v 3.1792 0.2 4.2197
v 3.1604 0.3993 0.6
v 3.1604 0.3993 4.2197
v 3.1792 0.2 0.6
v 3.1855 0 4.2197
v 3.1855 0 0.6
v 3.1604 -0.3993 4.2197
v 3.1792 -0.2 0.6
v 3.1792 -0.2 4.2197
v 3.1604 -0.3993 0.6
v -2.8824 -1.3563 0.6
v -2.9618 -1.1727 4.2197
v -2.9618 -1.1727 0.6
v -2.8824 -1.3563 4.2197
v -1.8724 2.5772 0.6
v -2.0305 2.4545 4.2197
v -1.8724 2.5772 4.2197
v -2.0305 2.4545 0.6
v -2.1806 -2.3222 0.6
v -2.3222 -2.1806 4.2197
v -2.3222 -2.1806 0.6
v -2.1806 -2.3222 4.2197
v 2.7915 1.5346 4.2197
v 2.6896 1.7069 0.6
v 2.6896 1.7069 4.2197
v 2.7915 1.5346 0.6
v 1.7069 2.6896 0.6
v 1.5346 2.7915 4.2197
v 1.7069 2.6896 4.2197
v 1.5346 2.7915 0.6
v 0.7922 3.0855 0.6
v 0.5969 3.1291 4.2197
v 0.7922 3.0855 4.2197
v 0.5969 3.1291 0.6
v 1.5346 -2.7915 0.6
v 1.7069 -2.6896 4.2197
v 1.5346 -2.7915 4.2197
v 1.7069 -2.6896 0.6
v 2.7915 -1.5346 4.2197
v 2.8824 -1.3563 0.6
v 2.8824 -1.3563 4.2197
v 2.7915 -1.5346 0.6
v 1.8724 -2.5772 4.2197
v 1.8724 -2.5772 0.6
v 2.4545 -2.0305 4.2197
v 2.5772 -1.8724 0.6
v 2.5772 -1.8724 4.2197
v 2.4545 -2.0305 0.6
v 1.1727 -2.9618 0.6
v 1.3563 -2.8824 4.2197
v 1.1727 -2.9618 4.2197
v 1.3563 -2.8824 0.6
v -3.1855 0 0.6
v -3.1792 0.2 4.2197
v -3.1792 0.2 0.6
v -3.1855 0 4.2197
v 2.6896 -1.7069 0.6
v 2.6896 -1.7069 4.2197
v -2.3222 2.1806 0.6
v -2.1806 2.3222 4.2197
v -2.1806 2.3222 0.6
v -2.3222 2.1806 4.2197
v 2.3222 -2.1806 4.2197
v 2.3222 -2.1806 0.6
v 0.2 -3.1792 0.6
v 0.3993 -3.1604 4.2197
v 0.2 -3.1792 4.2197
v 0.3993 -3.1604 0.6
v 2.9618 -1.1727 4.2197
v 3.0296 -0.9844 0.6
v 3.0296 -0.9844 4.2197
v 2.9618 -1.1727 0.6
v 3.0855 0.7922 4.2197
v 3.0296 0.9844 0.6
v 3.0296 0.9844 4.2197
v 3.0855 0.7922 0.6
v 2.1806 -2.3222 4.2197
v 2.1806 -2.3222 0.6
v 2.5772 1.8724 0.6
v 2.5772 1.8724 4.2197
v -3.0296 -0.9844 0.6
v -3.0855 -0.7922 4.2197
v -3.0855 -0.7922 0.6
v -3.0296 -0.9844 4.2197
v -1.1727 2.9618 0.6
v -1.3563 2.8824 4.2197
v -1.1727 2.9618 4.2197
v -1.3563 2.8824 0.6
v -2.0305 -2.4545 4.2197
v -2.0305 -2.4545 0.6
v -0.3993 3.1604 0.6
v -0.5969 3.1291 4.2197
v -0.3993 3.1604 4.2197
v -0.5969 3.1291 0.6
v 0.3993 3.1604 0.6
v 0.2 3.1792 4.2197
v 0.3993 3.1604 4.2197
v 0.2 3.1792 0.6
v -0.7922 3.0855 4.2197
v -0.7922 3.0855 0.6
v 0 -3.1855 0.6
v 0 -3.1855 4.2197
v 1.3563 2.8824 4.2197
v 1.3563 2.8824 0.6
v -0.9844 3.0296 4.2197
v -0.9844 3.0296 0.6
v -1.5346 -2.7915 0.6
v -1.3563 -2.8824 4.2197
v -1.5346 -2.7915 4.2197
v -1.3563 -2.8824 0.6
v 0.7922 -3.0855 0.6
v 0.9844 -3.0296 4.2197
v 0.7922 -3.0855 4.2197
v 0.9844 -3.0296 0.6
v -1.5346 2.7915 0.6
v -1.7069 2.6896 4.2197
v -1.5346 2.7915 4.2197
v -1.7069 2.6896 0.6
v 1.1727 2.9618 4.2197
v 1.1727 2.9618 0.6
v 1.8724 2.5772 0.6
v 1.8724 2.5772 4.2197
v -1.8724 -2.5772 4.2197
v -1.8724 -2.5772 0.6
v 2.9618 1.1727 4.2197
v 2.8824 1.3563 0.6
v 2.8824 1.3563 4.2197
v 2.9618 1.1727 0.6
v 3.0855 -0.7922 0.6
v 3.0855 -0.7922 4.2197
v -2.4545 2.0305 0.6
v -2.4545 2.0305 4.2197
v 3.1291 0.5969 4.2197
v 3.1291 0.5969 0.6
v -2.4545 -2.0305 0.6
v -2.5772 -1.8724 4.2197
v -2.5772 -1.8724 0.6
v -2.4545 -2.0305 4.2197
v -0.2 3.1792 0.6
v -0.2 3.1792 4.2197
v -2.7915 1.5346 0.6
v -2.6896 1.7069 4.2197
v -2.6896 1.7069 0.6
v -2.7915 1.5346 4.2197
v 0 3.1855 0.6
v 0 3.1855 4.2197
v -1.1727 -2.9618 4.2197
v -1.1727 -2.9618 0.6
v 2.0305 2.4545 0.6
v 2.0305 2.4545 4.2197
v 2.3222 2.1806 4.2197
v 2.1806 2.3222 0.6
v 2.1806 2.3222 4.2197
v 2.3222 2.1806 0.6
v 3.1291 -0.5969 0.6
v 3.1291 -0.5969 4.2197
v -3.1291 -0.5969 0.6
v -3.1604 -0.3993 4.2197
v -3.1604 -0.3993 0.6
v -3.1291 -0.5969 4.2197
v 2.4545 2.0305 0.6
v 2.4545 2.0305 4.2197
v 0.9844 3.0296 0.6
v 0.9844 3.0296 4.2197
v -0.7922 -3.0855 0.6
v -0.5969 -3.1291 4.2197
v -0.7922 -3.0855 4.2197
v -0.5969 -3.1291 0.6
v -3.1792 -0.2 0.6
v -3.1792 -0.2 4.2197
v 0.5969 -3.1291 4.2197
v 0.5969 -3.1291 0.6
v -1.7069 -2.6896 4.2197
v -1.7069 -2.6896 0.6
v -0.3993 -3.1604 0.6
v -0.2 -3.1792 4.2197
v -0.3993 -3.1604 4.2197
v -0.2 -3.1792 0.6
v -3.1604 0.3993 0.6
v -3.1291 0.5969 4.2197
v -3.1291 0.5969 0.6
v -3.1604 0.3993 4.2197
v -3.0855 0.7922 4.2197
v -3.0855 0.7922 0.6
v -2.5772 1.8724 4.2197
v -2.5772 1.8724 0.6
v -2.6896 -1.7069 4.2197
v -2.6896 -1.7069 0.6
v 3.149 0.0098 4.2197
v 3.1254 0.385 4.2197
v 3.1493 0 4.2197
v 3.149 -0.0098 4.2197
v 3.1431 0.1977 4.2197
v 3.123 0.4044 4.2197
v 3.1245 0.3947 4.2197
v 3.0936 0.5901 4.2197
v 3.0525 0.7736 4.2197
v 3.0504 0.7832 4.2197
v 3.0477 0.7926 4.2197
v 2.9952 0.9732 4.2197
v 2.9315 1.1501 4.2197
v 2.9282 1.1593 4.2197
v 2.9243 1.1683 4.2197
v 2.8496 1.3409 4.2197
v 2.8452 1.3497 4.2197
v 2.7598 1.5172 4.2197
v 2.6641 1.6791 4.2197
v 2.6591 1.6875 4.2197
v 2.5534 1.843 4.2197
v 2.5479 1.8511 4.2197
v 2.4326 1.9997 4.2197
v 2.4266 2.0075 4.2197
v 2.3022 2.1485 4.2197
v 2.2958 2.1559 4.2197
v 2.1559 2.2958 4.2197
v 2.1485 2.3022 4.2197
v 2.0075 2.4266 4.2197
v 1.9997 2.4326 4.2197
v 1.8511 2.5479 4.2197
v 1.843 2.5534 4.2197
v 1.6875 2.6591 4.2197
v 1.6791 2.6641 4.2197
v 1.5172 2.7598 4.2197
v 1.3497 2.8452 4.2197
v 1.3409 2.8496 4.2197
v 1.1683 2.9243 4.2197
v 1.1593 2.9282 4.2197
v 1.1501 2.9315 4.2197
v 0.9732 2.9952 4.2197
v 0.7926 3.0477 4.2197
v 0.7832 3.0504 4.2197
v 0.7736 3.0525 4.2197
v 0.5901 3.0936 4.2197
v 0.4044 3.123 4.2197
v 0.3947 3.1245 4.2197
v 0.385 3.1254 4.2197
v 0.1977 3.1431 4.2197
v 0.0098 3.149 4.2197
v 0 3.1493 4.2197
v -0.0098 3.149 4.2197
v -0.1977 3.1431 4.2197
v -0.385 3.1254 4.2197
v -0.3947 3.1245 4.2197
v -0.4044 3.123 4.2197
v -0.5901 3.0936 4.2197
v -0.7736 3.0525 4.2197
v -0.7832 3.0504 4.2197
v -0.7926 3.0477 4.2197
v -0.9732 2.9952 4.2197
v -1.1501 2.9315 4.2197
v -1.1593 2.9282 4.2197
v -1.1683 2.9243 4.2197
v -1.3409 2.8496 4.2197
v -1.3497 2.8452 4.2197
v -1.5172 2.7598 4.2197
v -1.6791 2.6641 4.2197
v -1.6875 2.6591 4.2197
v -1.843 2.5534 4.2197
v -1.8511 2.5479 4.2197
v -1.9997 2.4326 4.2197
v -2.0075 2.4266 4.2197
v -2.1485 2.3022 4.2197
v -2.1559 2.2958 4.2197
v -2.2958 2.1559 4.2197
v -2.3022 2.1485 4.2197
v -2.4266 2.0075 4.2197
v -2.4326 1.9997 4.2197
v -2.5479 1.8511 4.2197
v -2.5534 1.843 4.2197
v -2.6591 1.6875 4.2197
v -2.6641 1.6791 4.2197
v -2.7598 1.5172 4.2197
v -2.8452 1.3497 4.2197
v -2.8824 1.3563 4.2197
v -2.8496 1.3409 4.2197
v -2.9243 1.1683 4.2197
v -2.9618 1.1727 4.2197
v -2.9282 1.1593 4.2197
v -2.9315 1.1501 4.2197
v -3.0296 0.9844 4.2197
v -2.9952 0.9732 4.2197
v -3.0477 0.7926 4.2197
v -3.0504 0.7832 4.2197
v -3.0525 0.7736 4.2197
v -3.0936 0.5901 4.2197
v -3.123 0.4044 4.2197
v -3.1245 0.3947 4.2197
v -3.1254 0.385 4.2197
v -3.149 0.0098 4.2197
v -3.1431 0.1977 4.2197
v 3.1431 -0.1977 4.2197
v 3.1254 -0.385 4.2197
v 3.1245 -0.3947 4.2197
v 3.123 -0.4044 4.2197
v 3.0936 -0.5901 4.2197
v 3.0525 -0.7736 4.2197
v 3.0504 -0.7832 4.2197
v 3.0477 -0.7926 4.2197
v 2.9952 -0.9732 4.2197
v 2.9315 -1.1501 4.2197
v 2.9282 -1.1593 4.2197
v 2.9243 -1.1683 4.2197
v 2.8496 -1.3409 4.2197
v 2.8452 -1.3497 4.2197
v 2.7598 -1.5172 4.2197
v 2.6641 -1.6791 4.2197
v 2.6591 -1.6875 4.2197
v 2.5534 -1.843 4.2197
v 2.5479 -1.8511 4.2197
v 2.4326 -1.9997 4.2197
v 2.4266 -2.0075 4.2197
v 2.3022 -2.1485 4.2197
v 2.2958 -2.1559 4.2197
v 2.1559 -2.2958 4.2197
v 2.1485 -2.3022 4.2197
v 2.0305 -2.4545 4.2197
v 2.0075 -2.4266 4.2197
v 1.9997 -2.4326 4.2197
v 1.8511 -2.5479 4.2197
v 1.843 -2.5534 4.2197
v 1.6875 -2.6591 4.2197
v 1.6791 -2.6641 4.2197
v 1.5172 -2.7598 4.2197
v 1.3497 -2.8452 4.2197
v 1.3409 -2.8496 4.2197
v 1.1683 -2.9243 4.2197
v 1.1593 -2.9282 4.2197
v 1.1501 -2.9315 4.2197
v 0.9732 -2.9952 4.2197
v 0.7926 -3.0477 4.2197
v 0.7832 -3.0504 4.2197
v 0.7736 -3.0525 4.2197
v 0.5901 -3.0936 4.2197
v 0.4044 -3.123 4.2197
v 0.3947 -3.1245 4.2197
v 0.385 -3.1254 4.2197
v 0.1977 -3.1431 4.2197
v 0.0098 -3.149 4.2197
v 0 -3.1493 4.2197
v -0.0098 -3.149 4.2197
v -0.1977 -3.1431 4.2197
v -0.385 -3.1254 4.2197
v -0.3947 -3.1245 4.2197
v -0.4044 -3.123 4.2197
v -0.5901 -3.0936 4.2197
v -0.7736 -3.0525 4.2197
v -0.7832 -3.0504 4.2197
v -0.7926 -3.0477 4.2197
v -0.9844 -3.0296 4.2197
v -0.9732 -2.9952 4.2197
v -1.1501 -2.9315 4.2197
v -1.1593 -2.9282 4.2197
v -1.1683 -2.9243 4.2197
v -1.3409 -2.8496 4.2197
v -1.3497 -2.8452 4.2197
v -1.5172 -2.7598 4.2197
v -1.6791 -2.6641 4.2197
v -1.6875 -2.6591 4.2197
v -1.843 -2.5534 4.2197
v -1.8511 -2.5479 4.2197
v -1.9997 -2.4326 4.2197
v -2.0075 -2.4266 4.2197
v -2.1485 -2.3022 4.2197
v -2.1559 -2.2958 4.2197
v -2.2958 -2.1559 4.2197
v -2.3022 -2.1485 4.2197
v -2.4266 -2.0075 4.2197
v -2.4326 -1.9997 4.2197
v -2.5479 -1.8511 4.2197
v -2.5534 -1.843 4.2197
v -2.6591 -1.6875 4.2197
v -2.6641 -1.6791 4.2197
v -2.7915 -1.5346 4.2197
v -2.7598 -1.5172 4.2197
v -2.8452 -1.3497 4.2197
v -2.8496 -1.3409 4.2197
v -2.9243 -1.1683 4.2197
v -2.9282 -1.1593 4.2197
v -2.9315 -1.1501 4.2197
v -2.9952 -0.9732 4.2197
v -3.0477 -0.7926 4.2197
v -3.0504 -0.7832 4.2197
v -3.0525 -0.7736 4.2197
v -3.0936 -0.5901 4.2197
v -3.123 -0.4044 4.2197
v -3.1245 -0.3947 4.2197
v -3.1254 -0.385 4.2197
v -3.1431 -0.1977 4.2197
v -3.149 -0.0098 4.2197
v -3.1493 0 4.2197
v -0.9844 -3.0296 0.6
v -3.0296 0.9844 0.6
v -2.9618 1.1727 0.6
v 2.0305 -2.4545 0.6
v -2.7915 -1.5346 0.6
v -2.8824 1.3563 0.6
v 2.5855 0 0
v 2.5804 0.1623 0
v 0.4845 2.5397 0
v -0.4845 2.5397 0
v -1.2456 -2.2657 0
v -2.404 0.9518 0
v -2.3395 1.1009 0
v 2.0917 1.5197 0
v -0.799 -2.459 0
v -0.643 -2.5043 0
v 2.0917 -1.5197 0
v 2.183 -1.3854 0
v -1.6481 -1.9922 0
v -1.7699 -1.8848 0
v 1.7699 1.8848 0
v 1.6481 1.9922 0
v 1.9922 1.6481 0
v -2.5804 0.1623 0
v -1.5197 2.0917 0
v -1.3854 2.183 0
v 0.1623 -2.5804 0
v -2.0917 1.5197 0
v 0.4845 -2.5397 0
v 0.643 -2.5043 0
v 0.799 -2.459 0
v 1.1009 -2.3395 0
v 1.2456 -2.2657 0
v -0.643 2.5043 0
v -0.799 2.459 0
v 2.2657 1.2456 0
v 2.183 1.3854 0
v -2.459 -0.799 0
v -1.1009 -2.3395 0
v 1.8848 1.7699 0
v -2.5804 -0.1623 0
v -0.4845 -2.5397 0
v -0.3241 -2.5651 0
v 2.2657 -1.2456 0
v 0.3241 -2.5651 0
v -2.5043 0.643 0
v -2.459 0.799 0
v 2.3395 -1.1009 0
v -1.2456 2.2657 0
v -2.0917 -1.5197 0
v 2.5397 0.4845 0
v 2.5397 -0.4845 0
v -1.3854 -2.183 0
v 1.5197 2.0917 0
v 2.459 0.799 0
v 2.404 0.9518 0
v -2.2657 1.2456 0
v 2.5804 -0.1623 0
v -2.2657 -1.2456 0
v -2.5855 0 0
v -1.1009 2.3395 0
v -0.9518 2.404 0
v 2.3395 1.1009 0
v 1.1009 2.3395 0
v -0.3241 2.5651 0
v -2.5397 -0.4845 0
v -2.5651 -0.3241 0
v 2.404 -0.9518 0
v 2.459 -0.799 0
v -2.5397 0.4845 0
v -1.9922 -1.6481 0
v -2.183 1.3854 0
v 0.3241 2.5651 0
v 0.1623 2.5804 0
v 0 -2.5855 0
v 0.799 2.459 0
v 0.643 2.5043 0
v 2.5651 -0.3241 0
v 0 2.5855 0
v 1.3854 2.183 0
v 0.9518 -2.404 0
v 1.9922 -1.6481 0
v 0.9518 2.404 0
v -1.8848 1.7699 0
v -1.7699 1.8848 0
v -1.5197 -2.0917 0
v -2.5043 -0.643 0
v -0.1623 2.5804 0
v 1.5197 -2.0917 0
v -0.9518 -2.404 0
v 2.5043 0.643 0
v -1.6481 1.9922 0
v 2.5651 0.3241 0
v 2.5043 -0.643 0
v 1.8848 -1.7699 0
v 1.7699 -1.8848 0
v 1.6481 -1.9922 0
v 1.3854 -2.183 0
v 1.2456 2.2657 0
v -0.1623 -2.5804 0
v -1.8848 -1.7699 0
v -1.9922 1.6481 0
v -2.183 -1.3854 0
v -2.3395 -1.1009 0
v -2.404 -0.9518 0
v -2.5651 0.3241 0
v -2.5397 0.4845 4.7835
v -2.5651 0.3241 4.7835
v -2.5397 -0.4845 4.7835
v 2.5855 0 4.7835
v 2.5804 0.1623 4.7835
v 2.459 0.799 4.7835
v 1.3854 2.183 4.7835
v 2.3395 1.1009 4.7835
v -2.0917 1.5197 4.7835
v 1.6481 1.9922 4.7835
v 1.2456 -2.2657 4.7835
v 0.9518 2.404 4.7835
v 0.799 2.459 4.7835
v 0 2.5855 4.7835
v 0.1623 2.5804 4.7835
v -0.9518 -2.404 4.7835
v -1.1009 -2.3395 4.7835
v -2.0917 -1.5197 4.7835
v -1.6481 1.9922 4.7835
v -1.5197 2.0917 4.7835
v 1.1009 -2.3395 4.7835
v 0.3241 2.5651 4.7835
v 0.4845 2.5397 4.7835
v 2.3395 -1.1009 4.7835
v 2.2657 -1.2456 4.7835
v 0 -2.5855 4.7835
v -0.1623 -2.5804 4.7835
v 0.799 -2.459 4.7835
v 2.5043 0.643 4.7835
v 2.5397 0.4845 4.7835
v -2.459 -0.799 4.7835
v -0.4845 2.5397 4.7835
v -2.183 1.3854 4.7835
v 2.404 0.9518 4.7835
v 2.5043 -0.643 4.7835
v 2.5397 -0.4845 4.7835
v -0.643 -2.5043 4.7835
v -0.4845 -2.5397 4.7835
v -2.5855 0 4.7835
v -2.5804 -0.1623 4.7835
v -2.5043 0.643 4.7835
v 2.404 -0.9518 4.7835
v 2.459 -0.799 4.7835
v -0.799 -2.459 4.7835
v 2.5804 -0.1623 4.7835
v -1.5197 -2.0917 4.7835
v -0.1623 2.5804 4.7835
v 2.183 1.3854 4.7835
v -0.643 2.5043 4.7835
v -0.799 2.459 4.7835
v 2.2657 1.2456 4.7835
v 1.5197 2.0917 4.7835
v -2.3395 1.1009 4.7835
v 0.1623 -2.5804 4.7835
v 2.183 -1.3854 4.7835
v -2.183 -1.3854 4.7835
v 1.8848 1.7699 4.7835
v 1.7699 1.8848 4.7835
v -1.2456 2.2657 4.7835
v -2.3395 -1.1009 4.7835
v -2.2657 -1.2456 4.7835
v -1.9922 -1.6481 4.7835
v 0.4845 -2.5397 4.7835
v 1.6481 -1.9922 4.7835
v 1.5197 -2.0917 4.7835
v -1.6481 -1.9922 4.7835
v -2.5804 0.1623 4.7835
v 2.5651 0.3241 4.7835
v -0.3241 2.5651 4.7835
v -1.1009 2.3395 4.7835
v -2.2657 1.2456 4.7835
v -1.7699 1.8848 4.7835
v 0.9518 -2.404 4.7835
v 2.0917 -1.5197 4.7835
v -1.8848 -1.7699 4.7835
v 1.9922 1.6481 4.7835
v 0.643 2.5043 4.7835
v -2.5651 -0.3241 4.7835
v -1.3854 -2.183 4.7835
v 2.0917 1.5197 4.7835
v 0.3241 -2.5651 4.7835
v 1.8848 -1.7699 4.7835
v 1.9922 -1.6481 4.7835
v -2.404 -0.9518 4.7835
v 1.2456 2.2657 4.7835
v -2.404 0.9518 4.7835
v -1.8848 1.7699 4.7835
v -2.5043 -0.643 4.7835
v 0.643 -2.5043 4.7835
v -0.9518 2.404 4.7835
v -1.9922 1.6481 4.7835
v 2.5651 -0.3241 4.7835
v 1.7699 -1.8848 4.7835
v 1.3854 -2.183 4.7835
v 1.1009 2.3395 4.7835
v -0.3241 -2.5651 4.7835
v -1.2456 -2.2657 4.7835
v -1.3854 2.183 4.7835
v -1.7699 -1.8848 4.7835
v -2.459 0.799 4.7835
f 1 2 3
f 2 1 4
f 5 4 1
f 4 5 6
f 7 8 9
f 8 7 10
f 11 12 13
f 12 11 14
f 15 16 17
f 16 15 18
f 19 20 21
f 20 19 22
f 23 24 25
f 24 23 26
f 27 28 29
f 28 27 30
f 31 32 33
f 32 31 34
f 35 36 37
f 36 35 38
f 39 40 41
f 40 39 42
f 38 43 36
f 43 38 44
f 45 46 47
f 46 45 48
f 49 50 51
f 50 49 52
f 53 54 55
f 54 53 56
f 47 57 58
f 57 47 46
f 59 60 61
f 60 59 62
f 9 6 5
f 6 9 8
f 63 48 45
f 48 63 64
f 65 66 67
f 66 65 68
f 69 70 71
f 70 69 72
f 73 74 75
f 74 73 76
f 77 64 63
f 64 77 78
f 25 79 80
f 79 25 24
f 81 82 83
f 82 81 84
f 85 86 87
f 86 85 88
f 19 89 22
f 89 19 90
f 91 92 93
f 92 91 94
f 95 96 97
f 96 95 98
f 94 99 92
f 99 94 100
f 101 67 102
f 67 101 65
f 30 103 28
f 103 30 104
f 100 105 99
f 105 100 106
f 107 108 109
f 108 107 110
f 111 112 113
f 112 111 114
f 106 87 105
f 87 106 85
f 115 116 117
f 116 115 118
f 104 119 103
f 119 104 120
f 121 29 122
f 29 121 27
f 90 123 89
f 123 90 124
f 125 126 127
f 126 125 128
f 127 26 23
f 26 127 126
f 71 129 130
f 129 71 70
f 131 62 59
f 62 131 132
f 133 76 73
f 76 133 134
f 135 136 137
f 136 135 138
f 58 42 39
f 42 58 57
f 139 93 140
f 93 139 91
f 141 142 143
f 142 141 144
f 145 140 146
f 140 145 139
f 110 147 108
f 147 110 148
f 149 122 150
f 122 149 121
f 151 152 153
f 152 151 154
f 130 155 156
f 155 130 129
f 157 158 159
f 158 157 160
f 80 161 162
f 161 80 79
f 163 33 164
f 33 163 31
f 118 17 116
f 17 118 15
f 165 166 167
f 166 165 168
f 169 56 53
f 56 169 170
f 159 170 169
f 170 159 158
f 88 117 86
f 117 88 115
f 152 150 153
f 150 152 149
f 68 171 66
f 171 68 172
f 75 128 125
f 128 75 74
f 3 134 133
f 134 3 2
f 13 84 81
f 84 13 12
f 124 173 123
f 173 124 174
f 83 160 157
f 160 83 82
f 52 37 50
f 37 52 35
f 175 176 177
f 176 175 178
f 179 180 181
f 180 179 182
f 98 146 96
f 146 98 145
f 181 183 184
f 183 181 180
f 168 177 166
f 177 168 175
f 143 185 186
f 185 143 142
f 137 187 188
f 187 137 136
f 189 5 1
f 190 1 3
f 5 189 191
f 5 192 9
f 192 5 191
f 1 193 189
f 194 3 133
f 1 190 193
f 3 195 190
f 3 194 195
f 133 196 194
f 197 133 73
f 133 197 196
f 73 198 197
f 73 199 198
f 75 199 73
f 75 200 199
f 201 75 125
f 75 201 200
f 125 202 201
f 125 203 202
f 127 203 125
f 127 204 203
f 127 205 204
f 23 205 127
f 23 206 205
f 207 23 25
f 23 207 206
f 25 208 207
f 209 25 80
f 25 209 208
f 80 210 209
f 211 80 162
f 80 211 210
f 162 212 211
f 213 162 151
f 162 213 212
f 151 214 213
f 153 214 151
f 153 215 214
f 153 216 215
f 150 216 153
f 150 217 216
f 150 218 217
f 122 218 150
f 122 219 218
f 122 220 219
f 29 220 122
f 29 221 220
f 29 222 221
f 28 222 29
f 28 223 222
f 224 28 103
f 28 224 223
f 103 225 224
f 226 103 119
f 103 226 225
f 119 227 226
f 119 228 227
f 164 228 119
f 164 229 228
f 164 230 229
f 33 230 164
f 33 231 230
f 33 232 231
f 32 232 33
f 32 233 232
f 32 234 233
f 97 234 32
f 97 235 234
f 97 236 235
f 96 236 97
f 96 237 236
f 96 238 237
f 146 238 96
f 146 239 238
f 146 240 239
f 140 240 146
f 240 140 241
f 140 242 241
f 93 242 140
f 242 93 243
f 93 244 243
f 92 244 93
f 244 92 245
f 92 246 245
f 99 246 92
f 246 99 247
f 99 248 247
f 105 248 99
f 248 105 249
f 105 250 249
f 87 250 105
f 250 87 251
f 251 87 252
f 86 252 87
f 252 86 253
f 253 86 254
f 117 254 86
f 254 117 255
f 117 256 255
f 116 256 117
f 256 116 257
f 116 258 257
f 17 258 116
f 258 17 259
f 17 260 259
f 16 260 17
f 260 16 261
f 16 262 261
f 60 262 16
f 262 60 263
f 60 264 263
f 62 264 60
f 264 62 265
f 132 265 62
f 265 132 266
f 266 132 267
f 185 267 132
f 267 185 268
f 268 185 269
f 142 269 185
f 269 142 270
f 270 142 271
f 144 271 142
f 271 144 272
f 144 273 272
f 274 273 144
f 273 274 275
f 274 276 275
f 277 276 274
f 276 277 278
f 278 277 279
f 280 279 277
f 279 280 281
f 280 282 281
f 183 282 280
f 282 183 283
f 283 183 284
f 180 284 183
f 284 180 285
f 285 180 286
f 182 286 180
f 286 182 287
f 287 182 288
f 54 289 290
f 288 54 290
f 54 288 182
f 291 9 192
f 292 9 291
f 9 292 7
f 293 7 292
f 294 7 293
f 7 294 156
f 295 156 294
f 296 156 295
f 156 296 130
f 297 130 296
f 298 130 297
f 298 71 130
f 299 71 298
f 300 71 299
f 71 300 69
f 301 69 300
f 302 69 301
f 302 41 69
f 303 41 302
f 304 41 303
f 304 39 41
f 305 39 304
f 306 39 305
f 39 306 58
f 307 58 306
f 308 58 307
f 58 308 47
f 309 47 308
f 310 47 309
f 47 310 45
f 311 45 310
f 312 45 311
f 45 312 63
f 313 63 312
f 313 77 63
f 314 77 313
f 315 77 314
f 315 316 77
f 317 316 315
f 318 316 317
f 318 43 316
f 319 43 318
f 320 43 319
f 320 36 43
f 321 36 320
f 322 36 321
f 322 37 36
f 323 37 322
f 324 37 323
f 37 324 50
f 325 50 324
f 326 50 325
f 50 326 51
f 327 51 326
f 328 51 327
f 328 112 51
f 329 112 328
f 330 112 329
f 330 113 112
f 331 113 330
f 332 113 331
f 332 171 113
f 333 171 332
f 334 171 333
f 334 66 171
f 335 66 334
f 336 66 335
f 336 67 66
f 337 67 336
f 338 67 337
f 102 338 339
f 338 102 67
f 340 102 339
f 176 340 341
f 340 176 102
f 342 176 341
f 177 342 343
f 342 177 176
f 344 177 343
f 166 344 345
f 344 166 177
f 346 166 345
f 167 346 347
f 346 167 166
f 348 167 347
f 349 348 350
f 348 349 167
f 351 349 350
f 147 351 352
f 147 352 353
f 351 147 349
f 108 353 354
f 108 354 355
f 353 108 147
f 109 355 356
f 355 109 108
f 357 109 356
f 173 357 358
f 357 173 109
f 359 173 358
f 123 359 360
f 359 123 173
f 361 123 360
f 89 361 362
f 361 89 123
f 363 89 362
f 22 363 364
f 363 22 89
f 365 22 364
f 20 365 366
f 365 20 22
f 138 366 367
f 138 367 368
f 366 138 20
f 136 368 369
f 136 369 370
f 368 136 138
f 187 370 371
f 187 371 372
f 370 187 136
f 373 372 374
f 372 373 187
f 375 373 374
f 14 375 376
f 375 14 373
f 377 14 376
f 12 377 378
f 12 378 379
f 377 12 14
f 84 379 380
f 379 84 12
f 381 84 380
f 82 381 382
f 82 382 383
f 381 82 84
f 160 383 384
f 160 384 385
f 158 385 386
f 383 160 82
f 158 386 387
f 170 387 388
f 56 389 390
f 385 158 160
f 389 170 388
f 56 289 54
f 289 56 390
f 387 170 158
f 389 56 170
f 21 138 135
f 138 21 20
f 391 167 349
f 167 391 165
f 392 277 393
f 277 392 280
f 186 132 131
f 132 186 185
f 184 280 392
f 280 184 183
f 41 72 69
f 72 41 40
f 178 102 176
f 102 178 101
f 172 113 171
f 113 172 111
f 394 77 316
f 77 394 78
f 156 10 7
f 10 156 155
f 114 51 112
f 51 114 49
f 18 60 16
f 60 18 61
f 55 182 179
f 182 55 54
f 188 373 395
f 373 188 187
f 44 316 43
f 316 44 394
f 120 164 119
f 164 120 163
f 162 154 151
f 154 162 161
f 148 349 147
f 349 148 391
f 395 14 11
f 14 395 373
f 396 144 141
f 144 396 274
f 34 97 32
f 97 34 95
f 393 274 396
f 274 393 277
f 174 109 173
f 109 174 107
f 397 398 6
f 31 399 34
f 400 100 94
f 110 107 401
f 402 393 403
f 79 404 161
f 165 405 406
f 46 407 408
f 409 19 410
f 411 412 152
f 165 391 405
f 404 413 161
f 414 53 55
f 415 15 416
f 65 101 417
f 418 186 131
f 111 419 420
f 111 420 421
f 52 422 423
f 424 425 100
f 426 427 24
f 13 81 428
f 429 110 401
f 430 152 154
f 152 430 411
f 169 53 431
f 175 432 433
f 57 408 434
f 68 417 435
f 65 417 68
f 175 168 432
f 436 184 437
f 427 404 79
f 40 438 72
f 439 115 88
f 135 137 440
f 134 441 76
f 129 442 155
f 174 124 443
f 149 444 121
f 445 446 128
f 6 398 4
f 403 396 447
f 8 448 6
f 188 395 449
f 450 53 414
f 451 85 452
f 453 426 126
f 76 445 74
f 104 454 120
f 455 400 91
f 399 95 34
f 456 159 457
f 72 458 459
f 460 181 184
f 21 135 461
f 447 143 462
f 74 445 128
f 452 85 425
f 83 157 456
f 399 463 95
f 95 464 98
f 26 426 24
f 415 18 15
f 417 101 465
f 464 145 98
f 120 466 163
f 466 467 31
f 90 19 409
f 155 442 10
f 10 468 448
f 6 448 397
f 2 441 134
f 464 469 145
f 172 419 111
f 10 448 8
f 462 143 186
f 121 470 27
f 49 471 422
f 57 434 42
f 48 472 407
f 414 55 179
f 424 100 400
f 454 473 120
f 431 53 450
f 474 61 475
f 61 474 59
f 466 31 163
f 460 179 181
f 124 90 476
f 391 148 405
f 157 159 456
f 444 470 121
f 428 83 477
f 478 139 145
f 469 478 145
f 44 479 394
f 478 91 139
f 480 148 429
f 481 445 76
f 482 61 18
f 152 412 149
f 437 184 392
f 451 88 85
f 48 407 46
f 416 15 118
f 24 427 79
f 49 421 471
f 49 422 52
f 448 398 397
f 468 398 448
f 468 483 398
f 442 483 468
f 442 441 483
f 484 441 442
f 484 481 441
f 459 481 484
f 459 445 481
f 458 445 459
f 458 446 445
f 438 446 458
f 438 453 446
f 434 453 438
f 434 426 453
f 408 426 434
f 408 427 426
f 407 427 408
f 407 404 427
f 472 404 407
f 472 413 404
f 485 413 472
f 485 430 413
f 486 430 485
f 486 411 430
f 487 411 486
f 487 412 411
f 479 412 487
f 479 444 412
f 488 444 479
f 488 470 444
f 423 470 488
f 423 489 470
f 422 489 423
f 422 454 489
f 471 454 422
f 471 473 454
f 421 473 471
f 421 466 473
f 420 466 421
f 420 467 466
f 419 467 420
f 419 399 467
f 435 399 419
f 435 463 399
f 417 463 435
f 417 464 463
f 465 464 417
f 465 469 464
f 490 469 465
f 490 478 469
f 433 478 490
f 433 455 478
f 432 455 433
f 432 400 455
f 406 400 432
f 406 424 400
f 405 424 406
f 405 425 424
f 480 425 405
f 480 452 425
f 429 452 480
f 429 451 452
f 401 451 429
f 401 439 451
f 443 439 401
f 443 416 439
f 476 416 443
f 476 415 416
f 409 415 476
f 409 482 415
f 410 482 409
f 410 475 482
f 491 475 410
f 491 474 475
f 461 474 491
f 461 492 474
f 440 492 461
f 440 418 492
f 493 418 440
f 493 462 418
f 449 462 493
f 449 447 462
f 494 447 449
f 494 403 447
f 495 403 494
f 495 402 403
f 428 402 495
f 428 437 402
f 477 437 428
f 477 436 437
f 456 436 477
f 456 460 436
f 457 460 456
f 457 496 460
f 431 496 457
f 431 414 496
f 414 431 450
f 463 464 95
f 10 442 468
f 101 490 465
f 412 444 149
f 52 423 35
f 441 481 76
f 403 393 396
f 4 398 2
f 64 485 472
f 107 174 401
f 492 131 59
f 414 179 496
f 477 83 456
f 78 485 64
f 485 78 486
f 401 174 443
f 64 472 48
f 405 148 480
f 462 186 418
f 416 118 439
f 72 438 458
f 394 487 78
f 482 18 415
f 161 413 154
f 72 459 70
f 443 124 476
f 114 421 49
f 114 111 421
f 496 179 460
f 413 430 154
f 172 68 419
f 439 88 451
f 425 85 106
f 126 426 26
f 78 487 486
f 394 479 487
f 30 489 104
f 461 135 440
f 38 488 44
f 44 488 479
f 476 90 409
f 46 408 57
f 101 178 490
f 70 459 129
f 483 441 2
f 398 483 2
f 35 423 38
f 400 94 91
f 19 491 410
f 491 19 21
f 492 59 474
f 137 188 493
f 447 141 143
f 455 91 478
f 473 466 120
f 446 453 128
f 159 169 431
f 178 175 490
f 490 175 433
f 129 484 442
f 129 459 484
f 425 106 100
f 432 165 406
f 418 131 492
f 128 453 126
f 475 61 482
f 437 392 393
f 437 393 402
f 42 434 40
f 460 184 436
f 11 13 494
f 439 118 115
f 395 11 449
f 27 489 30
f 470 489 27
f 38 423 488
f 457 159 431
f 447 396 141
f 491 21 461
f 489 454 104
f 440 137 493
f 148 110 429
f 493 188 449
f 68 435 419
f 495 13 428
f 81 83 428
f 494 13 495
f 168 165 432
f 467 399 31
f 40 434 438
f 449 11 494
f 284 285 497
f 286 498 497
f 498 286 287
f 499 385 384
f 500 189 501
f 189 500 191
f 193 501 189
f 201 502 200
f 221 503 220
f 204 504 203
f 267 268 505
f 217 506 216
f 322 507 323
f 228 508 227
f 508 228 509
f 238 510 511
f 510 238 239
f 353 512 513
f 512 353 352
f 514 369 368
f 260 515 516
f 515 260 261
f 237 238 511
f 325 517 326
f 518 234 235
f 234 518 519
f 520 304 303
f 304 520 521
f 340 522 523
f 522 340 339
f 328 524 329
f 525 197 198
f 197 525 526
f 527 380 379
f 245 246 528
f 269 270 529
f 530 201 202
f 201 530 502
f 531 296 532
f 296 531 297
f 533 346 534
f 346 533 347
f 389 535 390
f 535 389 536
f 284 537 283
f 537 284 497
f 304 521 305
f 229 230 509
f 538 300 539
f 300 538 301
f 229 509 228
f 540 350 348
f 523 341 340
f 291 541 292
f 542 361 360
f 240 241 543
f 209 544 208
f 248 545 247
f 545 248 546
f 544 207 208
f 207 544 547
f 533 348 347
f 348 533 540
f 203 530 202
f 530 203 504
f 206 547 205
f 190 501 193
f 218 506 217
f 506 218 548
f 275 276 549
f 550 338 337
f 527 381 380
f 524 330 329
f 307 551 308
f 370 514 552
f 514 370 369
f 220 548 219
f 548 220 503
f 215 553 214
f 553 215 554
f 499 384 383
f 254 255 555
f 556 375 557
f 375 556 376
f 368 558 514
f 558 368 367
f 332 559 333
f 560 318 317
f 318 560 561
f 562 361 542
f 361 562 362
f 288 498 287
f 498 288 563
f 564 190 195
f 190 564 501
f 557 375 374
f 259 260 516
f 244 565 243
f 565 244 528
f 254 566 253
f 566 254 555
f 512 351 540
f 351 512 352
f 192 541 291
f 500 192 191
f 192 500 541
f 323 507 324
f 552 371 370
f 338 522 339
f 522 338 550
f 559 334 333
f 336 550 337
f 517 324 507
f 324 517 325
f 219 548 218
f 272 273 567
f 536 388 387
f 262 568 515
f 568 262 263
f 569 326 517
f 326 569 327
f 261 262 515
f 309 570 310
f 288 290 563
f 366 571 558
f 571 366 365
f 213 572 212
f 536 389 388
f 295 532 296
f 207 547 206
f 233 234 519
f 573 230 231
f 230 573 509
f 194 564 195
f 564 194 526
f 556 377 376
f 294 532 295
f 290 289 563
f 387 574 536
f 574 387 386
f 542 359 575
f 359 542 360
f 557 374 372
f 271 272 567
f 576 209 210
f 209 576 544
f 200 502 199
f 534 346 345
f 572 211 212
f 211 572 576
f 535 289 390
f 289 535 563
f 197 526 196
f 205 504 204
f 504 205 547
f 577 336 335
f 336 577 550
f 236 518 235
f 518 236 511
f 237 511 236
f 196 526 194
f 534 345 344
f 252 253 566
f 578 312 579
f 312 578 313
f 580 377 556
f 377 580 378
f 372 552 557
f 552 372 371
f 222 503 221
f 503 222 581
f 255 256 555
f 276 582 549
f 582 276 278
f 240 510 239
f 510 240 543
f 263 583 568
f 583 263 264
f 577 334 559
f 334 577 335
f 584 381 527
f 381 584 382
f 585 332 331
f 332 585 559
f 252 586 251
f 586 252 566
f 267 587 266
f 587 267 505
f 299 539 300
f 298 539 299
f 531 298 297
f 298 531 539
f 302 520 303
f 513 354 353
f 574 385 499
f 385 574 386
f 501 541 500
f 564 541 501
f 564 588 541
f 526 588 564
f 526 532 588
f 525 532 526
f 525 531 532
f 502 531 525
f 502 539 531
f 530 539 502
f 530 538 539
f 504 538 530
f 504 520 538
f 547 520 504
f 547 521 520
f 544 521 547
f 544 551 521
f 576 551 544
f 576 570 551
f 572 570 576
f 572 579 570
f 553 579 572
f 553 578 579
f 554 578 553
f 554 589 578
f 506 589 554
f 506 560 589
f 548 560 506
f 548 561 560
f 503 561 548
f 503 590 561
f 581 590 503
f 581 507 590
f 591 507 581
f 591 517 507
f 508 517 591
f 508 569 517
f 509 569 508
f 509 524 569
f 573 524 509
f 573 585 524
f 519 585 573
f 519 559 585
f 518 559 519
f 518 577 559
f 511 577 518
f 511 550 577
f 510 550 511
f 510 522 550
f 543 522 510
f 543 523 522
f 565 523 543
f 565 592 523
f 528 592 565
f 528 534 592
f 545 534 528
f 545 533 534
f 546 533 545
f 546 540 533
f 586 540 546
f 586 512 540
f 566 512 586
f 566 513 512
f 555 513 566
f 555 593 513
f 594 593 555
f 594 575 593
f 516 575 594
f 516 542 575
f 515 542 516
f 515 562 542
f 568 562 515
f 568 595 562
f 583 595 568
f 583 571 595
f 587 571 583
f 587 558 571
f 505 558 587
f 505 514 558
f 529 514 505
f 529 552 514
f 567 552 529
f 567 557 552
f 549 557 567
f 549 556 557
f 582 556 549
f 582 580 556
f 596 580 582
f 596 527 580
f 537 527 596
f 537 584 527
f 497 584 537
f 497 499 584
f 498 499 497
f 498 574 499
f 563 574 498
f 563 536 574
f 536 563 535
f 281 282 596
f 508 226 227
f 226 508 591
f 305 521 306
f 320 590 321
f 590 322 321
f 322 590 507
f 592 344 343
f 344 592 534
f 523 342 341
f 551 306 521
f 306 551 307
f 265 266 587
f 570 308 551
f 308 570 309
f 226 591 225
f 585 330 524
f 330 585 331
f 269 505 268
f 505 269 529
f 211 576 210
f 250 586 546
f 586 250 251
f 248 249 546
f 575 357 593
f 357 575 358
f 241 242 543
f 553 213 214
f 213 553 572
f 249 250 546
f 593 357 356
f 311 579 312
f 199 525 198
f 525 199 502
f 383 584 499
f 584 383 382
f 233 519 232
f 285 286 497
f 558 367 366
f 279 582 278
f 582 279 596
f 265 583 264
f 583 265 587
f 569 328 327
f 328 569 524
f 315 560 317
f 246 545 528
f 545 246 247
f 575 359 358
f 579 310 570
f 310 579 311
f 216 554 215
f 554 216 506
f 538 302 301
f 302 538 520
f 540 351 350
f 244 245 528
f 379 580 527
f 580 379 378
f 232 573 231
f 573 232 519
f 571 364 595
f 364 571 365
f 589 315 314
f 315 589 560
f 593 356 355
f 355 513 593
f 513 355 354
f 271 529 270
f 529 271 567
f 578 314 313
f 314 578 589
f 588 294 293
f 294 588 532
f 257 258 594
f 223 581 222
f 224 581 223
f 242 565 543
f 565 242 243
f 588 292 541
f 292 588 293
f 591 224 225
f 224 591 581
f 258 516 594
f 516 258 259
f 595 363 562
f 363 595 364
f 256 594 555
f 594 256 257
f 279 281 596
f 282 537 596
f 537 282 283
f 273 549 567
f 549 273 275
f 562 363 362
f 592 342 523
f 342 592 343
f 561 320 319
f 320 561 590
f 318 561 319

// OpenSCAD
// Radius of sphere in mm
sphere_radius=25; // [2:100]

// Calibration step: Set this to 0 and print a sphere.  squish_height is around half the difference between the sphere's diameter at the equator, and at the poles.
squish_height = .3;

// The diagonal of the hole, from center of the sphere to edge (usually 1mm less than sphere)
hole_max = sphere_radius-20; //[0:sphere_radius-1] 

//Resolution of sphere (number of line segments around its equator)
//Experiment with 20, then print at 100 
resolution = 100;

// Bevel height around hemisphere and around the pin
bevel_height = .6;

// Radius of hole minus radius of pin.
clearance = 0.35;

output = "pin"; //[pin,hemisphere]

/* [Hidden] */
hole_radius = hole_max*cos(45);
hole_height = hole_radius;


if(output == "hemisphere") {
		translate([0,0,squish_height]) rotate([180,0,0]) 
			difference() {
			difference() {
				union() {
					sphere(sphere_radius, $fn=resolution);
					cylinder(h=squish_height,r=sphere_radius, $fn=resolution);
				}

				translate([0,0,squish_height]){
					cylinder(h=sphere_radius,r=sphere_radius,$fn=resolution);
				}
				translate([0,0,-bevel_height+squish_height]){ 
					difference() {
						cylinder(h=bevel_height,r=sphere_radius,$fn=resolution);
						cylinder(h=bevel_height,r1=sphere_radius,r2=sphere_radius-bevel_height,$fn=resolution);
					}
				}

			}

			translate([0,0,-hole_height*.99+squish_height]){ 
				cylinder(h=hole_height,r=hole_radius,$fn=resolution);
			}

			translate([0,0,-bevel_height+squish_height]){
				cylinder(h=bevel_height,r1=hole_radius, r2=hole_radius+bevel_height,$fn=resolution);
			}	
		
		}
}
else if( output == "pin"){
	translate([0,0,bevel_height]){
	union() {
			cylinder(h=(hole_height-bevel_height-clearance)*1.4,r=hole_radius-clearance,$fn=resolution);
		translate([0,0,-bevel_height]) {
			cylinder(h=bevel_height,r2=hole_radius-clearance,r1=hole_radius-clearance-bevel_height,$fn=resolution);		
}
		translate([0,0,(hole_height-bevel_height-clearance)*1.4*.99]) {
			cylinder(h=bevel_height,r1=hole_radius-clearance,r2=hole_radius-clearance-bevel_height,$fn=resolution);
		}
	}
}
}
